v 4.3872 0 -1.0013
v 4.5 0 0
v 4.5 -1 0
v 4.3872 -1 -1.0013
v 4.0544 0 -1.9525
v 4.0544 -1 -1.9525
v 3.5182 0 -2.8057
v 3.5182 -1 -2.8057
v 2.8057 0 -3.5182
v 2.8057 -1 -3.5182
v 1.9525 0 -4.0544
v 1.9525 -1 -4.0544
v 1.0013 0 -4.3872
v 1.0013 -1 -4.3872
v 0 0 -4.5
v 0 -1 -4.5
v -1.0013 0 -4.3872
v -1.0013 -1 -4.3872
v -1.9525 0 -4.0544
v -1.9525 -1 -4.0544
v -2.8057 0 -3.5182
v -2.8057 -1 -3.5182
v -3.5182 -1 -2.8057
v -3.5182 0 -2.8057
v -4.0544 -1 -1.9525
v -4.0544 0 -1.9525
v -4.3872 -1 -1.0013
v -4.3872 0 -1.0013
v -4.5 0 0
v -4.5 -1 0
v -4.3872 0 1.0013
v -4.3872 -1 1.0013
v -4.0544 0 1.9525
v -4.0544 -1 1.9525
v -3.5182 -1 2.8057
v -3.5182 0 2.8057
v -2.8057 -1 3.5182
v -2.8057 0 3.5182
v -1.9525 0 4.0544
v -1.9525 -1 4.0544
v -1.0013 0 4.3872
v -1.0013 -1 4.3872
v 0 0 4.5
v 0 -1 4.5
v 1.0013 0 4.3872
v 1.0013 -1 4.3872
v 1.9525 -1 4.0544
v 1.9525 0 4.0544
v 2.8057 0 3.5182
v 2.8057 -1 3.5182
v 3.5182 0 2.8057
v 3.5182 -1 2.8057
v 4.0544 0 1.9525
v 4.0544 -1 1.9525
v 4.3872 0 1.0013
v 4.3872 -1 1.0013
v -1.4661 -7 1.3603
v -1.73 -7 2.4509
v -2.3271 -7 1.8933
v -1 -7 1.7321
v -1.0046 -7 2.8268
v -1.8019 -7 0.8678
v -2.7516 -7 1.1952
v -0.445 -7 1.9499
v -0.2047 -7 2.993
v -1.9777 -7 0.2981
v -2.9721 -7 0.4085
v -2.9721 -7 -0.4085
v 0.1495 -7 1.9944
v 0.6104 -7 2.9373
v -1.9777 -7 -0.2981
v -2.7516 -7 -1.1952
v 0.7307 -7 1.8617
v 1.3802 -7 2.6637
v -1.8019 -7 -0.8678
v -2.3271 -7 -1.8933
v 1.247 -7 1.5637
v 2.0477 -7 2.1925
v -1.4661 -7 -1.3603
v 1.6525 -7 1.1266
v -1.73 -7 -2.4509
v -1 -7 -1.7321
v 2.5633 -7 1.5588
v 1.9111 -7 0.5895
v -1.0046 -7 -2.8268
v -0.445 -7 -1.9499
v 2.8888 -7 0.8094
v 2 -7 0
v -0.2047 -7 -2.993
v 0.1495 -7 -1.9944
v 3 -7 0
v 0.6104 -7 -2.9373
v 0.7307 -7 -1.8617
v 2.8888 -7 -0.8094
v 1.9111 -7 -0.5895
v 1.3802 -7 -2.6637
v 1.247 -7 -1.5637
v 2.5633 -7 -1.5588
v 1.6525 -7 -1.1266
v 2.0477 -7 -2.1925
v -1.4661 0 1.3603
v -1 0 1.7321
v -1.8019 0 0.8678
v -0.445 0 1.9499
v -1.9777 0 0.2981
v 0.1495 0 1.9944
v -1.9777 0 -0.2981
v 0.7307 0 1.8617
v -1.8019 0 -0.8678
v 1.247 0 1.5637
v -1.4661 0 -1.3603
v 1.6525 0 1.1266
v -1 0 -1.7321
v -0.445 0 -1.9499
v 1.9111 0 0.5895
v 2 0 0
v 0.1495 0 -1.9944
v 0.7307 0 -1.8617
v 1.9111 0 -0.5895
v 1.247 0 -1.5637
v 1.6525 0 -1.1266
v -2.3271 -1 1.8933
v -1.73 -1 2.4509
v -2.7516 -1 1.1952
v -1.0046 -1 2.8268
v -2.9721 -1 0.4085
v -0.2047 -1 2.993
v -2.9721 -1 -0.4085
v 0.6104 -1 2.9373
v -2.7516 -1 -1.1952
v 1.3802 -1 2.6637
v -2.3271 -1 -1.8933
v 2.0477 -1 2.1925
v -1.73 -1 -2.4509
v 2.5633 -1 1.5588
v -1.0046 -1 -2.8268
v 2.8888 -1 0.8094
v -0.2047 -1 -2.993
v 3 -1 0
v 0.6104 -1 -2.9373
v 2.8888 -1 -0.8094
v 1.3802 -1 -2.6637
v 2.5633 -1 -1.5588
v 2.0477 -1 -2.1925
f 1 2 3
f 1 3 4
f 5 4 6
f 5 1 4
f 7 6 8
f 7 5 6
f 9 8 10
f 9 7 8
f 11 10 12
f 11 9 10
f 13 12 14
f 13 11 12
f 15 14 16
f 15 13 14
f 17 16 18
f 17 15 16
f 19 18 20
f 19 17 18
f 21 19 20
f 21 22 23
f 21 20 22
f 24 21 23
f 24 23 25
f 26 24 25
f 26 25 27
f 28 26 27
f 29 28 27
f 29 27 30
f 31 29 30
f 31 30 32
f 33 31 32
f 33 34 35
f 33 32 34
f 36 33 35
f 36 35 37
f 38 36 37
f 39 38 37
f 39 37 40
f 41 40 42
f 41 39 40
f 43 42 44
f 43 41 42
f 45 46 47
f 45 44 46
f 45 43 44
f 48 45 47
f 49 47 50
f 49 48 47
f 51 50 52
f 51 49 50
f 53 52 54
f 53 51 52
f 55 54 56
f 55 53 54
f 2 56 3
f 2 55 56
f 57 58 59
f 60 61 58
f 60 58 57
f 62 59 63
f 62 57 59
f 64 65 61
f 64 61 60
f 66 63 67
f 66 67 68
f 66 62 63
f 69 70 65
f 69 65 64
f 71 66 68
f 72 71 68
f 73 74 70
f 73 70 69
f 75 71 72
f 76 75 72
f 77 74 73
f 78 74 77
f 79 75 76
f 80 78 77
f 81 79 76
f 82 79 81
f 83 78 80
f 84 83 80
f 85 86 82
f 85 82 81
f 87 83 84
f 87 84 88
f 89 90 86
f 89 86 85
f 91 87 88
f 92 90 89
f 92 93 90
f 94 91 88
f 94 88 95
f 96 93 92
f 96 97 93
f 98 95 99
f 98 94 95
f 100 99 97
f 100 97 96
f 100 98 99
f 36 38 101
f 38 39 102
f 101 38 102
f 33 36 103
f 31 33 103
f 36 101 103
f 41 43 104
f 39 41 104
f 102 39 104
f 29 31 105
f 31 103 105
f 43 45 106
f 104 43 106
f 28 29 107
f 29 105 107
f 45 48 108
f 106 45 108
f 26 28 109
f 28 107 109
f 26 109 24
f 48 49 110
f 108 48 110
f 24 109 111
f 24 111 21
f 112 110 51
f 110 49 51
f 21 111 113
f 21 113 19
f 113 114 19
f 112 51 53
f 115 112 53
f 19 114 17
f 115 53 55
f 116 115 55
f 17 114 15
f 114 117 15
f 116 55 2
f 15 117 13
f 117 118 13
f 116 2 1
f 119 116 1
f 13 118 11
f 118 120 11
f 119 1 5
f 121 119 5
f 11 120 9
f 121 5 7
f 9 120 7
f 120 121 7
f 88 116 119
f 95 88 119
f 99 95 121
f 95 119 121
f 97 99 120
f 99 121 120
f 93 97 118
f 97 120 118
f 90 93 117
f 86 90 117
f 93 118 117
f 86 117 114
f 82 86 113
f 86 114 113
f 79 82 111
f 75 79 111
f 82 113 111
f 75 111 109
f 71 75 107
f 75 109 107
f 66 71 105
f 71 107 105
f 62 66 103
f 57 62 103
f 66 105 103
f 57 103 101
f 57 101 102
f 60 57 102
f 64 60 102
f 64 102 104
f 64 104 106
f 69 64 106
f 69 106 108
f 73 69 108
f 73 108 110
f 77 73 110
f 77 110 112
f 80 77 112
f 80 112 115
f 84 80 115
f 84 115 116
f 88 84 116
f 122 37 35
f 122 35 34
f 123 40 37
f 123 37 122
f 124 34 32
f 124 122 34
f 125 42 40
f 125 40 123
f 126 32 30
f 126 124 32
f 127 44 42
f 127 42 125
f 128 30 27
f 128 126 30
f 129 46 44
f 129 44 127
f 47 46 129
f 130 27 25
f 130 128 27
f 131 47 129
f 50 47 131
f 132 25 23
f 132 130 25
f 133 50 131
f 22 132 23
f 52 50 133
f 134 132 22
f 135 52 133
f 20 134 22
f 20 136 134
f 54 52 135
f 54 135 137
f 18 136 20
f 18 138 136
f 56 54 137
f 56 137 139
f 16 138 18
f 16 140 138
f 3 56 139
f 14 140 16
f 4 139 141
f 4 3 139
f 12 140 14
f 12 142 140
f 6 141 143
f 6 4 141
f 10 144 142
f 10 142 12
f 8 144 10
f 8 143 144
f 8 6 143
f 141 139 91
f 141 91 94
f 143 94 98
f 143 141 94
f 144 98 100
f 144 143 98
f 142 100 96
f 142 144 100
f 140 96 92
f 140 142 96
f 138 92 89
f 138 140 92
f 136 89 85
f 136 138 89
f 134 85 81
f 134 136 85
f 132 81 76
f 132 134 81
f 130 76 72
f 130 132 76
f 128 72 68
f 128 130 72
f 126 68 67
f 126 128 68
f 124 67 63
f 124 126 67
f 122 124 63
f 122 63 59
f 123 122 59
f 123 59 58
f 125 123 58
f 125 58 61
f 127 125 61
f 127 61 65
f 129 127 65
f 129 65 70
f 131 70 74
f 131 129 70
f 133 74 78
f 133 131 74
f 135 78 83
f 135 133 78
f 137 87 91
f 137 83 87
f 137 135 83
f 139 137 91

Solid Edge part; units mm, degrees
sketch "Sketch1" plane through (0, 0, 0) normal (0, -1, 0) x (1, 0, 0)
  circle A0 centre (0, 0) radius 4.5
extrude "Protrusion1" add sketch "Sketch1" along normal blind 1
sketch "Sketch2" plane through (0, 0, 0) normal (0, -1, 0) x (1, 0, 0)
  circle A0 centre (0, 0) radius 3
extrude "Extrusionsausprägung_2" add sketch "Sketch2" along normal blind 7
sketch "Sketch3" plane through (0, 0, 0) normal (0, -1, 0) x (1, 0, 0)
  circle A0 centre (0, 0) radius 2
extrude "Cutout1" cut sketch "Sketch3" along normal through all
